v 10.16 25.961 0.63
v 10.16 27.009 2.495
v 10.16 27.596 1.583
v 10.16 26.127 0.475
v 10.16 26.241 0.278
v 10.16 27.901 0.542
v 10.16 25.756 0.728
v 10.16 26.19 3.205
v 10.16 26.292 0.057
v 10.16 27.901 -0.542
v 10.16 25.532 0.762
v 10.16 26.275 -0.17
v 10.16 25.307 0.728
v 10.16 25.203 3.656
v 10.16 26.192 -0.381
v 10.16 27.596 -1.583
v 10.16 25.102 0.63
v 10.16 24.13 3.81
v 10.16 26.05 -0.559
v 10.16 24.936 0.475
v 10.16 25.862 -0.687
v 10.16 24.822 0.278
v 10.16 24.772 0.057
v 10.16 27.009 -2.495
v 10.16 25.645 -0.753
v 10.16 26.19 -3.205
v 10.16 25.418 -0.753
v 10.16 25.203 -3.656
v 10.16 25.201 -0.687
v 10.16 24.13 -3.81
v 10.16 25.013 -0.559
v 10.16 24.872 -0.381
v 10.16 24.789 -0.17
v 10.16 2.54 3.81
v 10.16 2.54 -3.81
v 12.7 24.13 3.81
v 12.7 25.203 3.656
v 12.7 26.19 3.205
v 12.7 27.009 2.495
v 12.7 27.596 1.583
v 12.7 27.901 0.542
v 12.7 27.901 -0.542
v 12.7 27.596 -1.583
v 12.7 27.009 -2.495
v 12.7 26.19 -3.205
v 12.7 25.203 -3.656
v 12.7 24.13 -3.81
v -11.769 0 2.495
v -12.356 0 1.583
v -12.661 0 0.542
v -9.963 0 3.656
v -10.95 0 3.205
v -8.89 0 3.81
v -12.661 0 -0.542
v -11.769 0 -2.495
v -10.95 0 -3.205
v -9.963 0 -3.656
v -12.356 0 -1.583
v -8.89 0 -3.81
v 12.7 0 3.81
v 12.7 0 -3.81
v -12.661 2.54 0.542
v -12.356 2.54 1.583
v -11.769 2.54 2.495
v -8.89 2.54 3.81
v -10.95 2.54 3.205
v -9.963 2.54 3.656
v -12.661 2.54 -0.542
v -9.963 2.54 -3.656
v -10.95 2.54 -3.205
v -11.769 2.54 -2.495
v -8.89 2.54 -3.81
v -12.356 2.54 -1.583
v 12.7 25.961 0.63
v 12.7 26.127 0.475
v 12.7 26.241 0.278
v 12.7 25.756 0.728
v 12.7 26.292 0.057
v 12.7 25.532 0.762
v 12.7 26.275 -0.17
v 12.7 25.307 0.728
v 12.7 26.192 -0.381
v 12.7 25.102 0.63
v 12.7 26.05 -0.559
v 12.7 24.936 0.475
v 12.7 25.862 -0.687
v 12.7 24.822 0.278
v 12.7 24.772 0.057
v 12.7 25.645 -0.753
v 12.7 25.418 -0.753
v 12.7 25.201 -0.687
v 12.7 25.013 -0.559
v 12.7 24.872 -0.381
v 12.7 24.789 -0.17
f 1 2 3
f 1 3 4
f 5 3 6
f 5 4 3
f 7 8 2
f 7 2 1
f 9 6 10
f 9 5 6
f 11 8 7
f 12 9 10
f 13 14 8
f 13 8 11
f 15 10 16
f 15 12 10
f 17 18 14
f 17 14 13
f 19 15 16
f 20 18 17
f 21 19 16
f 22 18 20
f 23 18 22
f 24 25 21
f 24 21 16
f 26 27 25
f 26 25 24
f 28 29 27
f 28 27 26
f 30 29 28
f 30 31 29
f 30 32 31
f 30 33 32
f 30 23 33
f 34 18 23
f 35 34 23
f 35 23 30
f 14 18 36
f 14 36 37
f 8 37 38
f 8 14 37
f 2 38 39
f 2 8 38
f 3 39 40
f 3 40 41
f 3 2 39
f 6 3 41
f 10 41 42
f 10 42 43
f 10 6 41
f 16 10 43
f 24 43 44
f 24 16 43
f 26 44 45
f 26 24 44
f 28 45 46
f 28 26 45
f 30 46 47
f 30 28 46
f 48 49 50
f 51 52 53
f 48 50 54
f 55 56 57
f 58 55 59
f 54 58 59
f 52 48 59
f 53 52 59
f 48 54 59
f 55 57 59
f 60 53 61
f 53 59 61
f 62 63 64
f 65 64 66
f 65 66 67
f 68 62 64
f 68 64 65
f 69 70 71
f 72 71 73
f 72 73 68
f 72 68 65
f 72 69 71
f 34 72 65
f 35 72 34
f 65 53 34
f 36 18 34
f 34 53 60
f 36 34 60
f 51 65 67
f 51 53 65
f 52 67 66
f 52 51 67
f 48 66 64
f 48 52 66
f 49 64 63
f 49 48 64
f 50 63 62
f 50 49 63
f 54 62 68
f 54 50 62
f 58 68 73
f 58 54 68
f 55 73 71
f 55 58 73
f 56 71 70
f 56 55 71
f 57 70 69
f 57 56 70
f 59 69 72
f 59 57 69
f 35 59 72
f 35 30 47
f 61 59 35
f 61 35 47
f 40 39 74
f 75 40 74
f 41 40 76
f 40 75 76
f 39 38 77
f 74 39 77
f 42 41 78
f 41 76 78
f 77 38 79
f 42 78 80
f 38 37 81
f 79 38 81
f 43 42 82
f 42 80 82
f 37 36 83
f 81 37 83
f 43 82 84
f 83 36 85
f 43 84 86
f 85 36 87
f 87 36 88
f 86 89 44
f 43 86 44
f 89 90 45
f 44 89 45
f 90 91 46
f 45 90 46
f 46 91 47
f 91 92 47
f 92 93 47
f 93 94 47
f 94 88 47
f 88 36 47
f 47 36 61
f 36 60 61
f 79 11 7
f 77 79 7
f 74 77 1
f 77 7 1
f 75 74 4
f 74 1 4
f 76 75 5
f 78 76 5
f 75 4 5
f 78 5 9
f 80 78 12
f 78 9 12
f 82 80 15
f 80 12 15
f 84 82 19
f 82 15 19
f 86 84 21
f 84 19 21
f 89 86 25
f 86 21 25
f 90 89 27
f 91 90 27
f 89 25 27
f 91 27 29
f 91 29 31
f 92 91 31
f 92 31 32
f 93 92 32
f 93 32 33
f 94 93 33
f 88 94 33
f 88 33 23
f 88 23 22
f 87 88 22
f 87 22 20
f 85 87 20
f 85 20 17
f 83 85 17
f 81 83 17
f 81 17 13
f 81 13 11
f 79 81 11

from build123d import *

# Parameters (mm, degrees)
SKETCH1_W           = 25.4
SKETCH1_H           = 7.62
BOSS_EXTRUDE1_DEPTH = 2.54
SKETCH3_W           = 2.54
SKETCH3_H           = 7.62
BOSS_EXTRUDE3_DEPTH = 25.4
FILLET1_RADIUS      = 3.81
FILLET1_LENGTH      = 2.54
SKETCH5_R           = 0.762
CUT_EXTRUDE1_DEPTH  = 25.4
FILLET2_RADIUS      = 3.81
FILLET2_LENGTH      = 2.54


with BuildPart() as part:
    # Sketch1 → Boss-Extrude1 (new body)
    with BuildSketch(Plane(origin=(0, 0, 0), x_dir=(1, 0, 0), z_dir=(0, 1, 0))):
        Rectangle(SKETCH1_W, SKETCH1_H)
    extrude(amount=BOSS_EXTRUDE1_DEPTH)

    # Sketch3 → Boss-Extrude3 (add)
    with BuildSketch(Plane(origin=(0, 2.54, 0), x_dir=(1, 0, 0), z_dir=(0, 1, 0))):
        with Locations((11.43, 0)):
            Rectangle(SKETCH3_W, SKETCH3_H)
    extrude(amount=BOSS_EXTRUDE3_DEPTH)

    # Fillet1: full round fillet: the end face becomes a half cylinder, R = half its width
    fillet1_face = Plane((-12.7, 1.27, 0), x_dir=(0, -1, 0), z_dir=(-1, 0, 0))  # on the end face: x along it, z out of the body
    fillet1_slab = fillet1_face.offset(-FILLET1_RADIUS / 2) * Box(FILLET1_LENGTH, 2 * FILLET1_RADIUS, FILLET1_RADIUS, mode=Mode.PRIVATE)  # the body's end, R deep
    fillet1_round = Plane((-8.89, 1.27, 0), x_dir=(-1, 0, 0), z_dir=(0, -1, 0)) * Cylinder(FILLET1_RADIUS, FILLET1_LENGTH, mode=Mode.PRIVATE)  # its axis R under the face
    add(fillet1_slab - fillet1_round, mode=Mode.SUBTRACT)

    # Sketch5 → Cut-Extrude1 (cut)
    with BuildSketch(Plane.ZY.offset(-10.16)):
        with Locations((0, 25.531689307)):
            Circle(SKETCH5_R)
    extrude(amount=-CUT_EXTRUDE1_DEPTH, mode=Mode.SUBTRACT)

    # Fillet2: full round fillet: the end face becomes a half cylinder, R = half its width
    fillet2_face = Plane((11.43, 27.94, 0), x_dir=(-1, 0, 0), z_dir=(0, 1, 0))  # on the end face: x along it, z out of the body
    fillet2_slab = fillet2_face.offset(-FILLET2_RADIUS / 2) * Box(FILLET2_LENGTH, 2 * FILLET2_RADIUS, FILLET2_RADIUS, mode=Mode.PRIVATE)  # the body's end, R deep
    fillet2_round = Plane((11.43, 24.13, 0), x_dir=(0, 1, 0), z_dir=(-1, 0, 0)) * Cylinder(FILLET2_RADIUS, FILLET2_LENGTH, mode=Mode.PRIVATE)  # its axis R under the face
    add(fillet2_slab - fillet2_round, mode=Mode.SUBTRACT)


solid = part.part
